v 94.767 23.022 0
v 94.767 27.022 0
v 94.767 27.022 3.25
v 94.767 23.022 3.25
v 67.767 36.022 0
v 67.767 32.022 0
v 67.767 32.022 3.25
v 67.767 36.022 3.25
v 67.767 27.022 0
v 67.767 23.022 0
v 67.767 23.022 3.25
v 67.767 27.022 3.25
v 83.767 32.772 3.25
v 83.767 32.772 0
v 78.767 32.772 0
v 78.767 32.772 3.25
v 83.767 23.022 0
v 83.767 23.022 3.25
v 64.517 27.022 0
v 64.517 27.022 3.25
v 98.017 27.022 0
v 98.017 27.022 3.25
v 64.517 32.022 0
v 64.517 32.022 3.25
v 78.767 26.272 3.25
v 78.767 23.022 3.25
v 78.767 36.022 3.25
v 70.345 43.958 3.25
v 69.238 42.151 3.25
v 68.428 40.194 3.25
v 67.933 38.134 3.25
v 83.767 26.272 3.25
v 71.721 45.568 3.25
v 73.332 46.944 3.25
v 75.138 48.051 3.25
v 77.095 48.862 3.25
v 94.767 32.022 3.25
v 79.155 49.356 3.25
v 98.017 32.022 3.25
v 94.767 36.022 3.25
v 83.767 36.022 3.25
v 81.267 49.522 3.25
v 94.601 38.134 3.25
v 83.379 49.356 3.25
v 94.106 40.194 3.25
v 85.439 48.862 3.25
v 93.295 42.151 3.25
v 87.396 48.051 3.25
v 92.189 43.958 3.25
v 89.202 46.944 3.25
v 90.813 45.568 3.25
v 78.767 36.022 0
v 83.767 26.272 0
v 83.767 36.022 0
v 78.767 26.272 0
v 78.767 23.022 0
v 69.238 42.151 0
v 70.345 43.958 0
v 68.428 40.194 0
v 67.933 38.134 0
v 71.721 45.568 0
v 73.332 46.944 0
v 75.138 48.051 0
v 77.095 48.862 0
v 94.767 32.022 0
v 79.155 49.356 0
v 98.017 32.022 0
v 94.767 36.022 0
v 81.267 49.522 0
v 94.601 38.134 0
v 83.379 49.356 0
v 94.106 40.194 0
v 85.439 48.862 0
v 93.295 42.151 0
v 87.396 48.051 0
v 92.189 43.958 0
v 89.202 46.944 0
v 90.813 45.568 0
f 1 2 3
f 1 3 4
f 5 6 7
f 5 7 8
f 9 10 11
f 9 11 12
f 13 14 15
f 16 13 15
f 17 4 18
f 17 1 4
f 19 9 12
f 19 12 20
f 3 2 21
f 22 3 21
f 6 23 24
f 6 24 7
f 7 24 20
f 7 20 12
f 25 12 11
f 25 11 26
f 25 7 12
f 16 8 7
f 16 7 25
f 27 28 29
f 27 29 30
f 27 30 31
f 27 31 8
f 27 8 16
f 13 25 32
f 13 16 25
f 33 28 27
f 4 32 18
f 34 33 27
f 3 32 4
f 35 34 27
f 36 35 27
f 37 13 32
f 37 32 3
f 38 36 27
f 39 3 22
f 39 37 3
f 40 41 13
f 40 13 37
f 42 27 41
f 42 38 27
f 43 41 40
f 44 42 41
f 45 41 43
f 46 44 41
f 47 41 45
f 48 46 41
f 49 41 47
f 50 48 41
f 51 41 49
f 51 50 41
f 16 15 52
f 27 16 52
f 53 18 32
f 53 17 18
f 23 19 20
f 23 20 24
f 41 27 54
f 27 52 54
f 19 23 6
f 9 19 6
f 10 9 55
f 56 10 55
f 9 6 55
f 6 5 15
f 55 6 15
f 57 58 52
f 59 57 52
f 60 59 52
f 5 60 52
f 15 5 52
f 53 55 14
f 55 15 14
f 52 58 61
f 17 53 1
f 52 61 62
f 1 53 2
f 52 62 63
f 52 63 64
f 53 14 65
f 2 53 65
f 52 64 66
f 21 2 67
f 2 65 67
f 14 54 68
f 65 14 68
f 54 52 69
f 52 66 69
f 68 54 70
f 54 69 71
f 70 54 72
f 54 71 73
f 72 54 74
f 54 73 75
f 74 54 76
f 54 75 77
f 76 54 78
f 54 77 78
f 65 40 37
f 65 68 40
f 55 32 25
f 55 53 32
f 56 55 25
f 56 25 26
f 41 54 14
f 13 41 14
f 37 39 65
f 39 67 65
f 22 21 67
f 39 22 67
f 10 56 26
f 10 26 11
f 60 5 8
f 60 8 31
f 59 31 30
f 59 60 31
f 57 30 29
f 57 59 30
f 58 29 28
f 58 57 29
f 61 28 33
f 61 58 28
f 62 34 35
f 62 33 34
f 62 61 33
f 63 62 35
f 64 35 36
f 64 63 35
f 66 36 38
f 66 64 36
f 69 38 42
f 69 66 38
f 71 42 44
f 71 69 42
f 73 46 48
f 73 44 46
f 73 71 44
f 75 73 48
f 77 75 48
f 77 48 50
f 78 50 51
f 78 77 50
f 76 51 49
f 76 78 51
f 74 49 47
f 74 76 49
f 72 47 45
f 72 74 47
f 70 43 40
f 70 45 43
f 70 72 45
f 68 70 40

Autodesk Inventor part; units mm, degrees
ref_plane "YZ Plane" through (0, 0, 0) normal (1, 0, 0) x (0, 1, 0)
ref_plane "XZ Plane" through (0, 0, 0) normal (0, 1, 0) x (-1, 0, 0)
ref_plane "XY Plane" through (0, 0, 0) normal (0, 0, 1) x (1, 0, 0)
sketch "Block1" plane through (0, 0, 0) normal (0, 0, 1) x (1, 0, 0)
  circle A0 centre (74.029, 24.2723) radius 1
  line L0 (49.279, 30.4723) -> (71.779, 30.4723)
  line L1 (71.779, 30.4723) -> (71.779, 18.0723)
  line L2 (71.779, 18.0723) -> (49.279, 18.0723)
  line L3 (49.279, 18.0723) -> (49.279, 30.4723)
  line L4 (49.279, 30.4723) -> (44.779, 30.4723)
  line L5 (44.779, 30.4723) -> (44.779, 18.0723)
  line L6 (44.779, 18.0723) -> (49.279, 18.0723)
  line L7 (49.279, 18.0723) -> (49.279, 30.4723)
  line L8 (71.779, 30.4723) -> (76.279, 30.4723)
  line L9 (76.279, 30.4723) -> (76.279, 18.0723)
  line L10 (76.279, 18.0723) -> (71.779, 18.0723)
  line L11 (71.779, 18.0723) -> (71.779, 30.4723)
  line L12 (44.779, 24.2723) -> (76.279, 24.2723) construction
  line L13 (47.029, 30.4723) -> (47.029, 18.0723) construction
  circle A1 centre (47.029, 24.2723) radius 1
  line L14 (74.029, 30.4723) -> (74.029, 18.0723) construction
  point P0 (60.979, 24.0984)
  dimension "d7" = 22.5
  dimension "d8" = 12.4
  dimension "d9" = 4.5
  dimension "d10" = 4.5
  dimension "d11" = 2
  dimension "d12" = 2
sketch "Sketch1" plane through (0, 0, 0) normal (0, 0, 1) x (1, 0, 0)
  line L0 (-92.7646, -8.503) -> (-89.7646, -8.503)
  line L1 (-89.7646, -8.503) -> (-89.7646, -11.753)
  line L2 (-89.7646, -11.753) -> (-92.7646, -11.753)
  line L3 (-92.7646, -11.753) -> (-92.7646, -8.503)
  line L4 (-92.7646, -21.6527) -> (-89.7646, -21.6527)
  line L5 (-89.7646, -21.6527) -> (-89.7646, -21.7527)
  line L6 (-89.7646, -21.7527) -> (-92.7646, -21.7527)
  line L7 (-92.7646, -21.7527) -> (-92.7646, -21.6527)
  line L8 (67.7668, 36.0225) -> (94.7668, 36.0225)
  line L9 (94.7668, 36.0225) -> (94.7668, 23.0225)
  line L10 (94.7668, 23.0225) -> (67.7668, 23.0225)
  line L11 (67.7668, 23.0225) -> (67.7668, 36.0225)
  line L12 (67.7668, 29.5225) -> (94.7668, 29.5225) construction
  line L13 (64.5168, 32.0225) -> (67.7668, 32.0225)
  line L14 (67.7668, 32.0225) -> (67.7668, 27.0225)
  line L15 (67.7668, 27.0225) -> (64.5168, 27.0225)
  line L16 (64.5168, 27.0225) -> (64.5168, 32.0225)
  line L17 (64.5168, 29.5225) -> (67.7668, 29.5225) construction
  line L18 (81.2668, 36.0225) -> (81.2668, 23.0225) construction
  line L19 (78.7668, 36.0225) -> (83.7668, 36.0225)
  line L20 (83.7668, 36.0225) -> (83.7668, 32.7725)
  line L21 (83.7668, 32.7725) -> (78.7668, 32.7725)
  line L22 (78.7668, 32.7725) -> (78.7668, 36.0225)
  line L23 (81.2668, 36.0225) -> (81.2668, 32.7725) construction
  line L24 (98.0168, 32.0225) -> (94.7668, 32.0225)
  line L25 (94.7668, 32.0225) -> (94.7668, 27.0225)
  line L26 (94.7668, 27.0225) -> (98.0168, 27.0225)
  line L27 (98.0168, 27.0225) -> (98.0168, 32.0225)
  line L28 (98.0168, 29.5225) -> (94.7668, 29.5225) construction
  line L29 (78.7668, 23.0225) -> (83.7668, 23.0225)
  line L30 (83.7668, 23.0225) -> (83.7668, 26.2725)
  line L31 (83.7668, 26.2725) -> (78.7668, 26.2725)
  line L32 (78.7668, 26.2725) -> (78.7668, 23.0225)
  line L33 (81.2668, 23.0225) -> (81.2668, 26.2725) construction
  arc A0 (94.7668, 36.0225) -> (67.7668, 36.0225) centre (81.2668, 36.0225) ccw
  point P0 (0, 0)
  dimension "d0" = 3
  dimension "mat" = 3.25
  dimension "d2" = 3
  dimension "d3" = 0.1
  dimension "d58" = 27
  dimension "d59" = 13
  dimension "d60" = 3.25
  dimension "d61" = 5
  dimension "d68" = 5
  dimension "d69" = 3.25
extrude "Extrusion5" add sketch "Sketch1" along normal blind 3.25 contours L8 L22 L21 L20 L9 L10 L30 L31 L32 L11 | L8 L20 L21 L22 | L11 L15 L16 L13 | L32 L31 L30 L10
extrude "Extrusion7" cut sketch "Sketch1" along normal blind 3.25 contours L8 L20 L21 L22
extrude "Extrusion8" cut sketch "Sketch1" along normal blind 3.25 contours L32 L31 L30 L10
extrude "Extrusion9" add sketch "Sketch1" along normal blind 3.25 contours L24 L27 L26 L9
extrude "Extrusion10" add sketch "Sketch1" along normal blind 3.25 contours A0 L8
equation "\"d60\" = mat"
equation "\"d69\" = mat"
equation "\"d62\" = mat"
equation "\"d70\" = mat"
equation "\"d72\" = mat"
equation "\"d74\" = mat"
equation "\"d76\" = mat"
properties part number "arm-servo"
